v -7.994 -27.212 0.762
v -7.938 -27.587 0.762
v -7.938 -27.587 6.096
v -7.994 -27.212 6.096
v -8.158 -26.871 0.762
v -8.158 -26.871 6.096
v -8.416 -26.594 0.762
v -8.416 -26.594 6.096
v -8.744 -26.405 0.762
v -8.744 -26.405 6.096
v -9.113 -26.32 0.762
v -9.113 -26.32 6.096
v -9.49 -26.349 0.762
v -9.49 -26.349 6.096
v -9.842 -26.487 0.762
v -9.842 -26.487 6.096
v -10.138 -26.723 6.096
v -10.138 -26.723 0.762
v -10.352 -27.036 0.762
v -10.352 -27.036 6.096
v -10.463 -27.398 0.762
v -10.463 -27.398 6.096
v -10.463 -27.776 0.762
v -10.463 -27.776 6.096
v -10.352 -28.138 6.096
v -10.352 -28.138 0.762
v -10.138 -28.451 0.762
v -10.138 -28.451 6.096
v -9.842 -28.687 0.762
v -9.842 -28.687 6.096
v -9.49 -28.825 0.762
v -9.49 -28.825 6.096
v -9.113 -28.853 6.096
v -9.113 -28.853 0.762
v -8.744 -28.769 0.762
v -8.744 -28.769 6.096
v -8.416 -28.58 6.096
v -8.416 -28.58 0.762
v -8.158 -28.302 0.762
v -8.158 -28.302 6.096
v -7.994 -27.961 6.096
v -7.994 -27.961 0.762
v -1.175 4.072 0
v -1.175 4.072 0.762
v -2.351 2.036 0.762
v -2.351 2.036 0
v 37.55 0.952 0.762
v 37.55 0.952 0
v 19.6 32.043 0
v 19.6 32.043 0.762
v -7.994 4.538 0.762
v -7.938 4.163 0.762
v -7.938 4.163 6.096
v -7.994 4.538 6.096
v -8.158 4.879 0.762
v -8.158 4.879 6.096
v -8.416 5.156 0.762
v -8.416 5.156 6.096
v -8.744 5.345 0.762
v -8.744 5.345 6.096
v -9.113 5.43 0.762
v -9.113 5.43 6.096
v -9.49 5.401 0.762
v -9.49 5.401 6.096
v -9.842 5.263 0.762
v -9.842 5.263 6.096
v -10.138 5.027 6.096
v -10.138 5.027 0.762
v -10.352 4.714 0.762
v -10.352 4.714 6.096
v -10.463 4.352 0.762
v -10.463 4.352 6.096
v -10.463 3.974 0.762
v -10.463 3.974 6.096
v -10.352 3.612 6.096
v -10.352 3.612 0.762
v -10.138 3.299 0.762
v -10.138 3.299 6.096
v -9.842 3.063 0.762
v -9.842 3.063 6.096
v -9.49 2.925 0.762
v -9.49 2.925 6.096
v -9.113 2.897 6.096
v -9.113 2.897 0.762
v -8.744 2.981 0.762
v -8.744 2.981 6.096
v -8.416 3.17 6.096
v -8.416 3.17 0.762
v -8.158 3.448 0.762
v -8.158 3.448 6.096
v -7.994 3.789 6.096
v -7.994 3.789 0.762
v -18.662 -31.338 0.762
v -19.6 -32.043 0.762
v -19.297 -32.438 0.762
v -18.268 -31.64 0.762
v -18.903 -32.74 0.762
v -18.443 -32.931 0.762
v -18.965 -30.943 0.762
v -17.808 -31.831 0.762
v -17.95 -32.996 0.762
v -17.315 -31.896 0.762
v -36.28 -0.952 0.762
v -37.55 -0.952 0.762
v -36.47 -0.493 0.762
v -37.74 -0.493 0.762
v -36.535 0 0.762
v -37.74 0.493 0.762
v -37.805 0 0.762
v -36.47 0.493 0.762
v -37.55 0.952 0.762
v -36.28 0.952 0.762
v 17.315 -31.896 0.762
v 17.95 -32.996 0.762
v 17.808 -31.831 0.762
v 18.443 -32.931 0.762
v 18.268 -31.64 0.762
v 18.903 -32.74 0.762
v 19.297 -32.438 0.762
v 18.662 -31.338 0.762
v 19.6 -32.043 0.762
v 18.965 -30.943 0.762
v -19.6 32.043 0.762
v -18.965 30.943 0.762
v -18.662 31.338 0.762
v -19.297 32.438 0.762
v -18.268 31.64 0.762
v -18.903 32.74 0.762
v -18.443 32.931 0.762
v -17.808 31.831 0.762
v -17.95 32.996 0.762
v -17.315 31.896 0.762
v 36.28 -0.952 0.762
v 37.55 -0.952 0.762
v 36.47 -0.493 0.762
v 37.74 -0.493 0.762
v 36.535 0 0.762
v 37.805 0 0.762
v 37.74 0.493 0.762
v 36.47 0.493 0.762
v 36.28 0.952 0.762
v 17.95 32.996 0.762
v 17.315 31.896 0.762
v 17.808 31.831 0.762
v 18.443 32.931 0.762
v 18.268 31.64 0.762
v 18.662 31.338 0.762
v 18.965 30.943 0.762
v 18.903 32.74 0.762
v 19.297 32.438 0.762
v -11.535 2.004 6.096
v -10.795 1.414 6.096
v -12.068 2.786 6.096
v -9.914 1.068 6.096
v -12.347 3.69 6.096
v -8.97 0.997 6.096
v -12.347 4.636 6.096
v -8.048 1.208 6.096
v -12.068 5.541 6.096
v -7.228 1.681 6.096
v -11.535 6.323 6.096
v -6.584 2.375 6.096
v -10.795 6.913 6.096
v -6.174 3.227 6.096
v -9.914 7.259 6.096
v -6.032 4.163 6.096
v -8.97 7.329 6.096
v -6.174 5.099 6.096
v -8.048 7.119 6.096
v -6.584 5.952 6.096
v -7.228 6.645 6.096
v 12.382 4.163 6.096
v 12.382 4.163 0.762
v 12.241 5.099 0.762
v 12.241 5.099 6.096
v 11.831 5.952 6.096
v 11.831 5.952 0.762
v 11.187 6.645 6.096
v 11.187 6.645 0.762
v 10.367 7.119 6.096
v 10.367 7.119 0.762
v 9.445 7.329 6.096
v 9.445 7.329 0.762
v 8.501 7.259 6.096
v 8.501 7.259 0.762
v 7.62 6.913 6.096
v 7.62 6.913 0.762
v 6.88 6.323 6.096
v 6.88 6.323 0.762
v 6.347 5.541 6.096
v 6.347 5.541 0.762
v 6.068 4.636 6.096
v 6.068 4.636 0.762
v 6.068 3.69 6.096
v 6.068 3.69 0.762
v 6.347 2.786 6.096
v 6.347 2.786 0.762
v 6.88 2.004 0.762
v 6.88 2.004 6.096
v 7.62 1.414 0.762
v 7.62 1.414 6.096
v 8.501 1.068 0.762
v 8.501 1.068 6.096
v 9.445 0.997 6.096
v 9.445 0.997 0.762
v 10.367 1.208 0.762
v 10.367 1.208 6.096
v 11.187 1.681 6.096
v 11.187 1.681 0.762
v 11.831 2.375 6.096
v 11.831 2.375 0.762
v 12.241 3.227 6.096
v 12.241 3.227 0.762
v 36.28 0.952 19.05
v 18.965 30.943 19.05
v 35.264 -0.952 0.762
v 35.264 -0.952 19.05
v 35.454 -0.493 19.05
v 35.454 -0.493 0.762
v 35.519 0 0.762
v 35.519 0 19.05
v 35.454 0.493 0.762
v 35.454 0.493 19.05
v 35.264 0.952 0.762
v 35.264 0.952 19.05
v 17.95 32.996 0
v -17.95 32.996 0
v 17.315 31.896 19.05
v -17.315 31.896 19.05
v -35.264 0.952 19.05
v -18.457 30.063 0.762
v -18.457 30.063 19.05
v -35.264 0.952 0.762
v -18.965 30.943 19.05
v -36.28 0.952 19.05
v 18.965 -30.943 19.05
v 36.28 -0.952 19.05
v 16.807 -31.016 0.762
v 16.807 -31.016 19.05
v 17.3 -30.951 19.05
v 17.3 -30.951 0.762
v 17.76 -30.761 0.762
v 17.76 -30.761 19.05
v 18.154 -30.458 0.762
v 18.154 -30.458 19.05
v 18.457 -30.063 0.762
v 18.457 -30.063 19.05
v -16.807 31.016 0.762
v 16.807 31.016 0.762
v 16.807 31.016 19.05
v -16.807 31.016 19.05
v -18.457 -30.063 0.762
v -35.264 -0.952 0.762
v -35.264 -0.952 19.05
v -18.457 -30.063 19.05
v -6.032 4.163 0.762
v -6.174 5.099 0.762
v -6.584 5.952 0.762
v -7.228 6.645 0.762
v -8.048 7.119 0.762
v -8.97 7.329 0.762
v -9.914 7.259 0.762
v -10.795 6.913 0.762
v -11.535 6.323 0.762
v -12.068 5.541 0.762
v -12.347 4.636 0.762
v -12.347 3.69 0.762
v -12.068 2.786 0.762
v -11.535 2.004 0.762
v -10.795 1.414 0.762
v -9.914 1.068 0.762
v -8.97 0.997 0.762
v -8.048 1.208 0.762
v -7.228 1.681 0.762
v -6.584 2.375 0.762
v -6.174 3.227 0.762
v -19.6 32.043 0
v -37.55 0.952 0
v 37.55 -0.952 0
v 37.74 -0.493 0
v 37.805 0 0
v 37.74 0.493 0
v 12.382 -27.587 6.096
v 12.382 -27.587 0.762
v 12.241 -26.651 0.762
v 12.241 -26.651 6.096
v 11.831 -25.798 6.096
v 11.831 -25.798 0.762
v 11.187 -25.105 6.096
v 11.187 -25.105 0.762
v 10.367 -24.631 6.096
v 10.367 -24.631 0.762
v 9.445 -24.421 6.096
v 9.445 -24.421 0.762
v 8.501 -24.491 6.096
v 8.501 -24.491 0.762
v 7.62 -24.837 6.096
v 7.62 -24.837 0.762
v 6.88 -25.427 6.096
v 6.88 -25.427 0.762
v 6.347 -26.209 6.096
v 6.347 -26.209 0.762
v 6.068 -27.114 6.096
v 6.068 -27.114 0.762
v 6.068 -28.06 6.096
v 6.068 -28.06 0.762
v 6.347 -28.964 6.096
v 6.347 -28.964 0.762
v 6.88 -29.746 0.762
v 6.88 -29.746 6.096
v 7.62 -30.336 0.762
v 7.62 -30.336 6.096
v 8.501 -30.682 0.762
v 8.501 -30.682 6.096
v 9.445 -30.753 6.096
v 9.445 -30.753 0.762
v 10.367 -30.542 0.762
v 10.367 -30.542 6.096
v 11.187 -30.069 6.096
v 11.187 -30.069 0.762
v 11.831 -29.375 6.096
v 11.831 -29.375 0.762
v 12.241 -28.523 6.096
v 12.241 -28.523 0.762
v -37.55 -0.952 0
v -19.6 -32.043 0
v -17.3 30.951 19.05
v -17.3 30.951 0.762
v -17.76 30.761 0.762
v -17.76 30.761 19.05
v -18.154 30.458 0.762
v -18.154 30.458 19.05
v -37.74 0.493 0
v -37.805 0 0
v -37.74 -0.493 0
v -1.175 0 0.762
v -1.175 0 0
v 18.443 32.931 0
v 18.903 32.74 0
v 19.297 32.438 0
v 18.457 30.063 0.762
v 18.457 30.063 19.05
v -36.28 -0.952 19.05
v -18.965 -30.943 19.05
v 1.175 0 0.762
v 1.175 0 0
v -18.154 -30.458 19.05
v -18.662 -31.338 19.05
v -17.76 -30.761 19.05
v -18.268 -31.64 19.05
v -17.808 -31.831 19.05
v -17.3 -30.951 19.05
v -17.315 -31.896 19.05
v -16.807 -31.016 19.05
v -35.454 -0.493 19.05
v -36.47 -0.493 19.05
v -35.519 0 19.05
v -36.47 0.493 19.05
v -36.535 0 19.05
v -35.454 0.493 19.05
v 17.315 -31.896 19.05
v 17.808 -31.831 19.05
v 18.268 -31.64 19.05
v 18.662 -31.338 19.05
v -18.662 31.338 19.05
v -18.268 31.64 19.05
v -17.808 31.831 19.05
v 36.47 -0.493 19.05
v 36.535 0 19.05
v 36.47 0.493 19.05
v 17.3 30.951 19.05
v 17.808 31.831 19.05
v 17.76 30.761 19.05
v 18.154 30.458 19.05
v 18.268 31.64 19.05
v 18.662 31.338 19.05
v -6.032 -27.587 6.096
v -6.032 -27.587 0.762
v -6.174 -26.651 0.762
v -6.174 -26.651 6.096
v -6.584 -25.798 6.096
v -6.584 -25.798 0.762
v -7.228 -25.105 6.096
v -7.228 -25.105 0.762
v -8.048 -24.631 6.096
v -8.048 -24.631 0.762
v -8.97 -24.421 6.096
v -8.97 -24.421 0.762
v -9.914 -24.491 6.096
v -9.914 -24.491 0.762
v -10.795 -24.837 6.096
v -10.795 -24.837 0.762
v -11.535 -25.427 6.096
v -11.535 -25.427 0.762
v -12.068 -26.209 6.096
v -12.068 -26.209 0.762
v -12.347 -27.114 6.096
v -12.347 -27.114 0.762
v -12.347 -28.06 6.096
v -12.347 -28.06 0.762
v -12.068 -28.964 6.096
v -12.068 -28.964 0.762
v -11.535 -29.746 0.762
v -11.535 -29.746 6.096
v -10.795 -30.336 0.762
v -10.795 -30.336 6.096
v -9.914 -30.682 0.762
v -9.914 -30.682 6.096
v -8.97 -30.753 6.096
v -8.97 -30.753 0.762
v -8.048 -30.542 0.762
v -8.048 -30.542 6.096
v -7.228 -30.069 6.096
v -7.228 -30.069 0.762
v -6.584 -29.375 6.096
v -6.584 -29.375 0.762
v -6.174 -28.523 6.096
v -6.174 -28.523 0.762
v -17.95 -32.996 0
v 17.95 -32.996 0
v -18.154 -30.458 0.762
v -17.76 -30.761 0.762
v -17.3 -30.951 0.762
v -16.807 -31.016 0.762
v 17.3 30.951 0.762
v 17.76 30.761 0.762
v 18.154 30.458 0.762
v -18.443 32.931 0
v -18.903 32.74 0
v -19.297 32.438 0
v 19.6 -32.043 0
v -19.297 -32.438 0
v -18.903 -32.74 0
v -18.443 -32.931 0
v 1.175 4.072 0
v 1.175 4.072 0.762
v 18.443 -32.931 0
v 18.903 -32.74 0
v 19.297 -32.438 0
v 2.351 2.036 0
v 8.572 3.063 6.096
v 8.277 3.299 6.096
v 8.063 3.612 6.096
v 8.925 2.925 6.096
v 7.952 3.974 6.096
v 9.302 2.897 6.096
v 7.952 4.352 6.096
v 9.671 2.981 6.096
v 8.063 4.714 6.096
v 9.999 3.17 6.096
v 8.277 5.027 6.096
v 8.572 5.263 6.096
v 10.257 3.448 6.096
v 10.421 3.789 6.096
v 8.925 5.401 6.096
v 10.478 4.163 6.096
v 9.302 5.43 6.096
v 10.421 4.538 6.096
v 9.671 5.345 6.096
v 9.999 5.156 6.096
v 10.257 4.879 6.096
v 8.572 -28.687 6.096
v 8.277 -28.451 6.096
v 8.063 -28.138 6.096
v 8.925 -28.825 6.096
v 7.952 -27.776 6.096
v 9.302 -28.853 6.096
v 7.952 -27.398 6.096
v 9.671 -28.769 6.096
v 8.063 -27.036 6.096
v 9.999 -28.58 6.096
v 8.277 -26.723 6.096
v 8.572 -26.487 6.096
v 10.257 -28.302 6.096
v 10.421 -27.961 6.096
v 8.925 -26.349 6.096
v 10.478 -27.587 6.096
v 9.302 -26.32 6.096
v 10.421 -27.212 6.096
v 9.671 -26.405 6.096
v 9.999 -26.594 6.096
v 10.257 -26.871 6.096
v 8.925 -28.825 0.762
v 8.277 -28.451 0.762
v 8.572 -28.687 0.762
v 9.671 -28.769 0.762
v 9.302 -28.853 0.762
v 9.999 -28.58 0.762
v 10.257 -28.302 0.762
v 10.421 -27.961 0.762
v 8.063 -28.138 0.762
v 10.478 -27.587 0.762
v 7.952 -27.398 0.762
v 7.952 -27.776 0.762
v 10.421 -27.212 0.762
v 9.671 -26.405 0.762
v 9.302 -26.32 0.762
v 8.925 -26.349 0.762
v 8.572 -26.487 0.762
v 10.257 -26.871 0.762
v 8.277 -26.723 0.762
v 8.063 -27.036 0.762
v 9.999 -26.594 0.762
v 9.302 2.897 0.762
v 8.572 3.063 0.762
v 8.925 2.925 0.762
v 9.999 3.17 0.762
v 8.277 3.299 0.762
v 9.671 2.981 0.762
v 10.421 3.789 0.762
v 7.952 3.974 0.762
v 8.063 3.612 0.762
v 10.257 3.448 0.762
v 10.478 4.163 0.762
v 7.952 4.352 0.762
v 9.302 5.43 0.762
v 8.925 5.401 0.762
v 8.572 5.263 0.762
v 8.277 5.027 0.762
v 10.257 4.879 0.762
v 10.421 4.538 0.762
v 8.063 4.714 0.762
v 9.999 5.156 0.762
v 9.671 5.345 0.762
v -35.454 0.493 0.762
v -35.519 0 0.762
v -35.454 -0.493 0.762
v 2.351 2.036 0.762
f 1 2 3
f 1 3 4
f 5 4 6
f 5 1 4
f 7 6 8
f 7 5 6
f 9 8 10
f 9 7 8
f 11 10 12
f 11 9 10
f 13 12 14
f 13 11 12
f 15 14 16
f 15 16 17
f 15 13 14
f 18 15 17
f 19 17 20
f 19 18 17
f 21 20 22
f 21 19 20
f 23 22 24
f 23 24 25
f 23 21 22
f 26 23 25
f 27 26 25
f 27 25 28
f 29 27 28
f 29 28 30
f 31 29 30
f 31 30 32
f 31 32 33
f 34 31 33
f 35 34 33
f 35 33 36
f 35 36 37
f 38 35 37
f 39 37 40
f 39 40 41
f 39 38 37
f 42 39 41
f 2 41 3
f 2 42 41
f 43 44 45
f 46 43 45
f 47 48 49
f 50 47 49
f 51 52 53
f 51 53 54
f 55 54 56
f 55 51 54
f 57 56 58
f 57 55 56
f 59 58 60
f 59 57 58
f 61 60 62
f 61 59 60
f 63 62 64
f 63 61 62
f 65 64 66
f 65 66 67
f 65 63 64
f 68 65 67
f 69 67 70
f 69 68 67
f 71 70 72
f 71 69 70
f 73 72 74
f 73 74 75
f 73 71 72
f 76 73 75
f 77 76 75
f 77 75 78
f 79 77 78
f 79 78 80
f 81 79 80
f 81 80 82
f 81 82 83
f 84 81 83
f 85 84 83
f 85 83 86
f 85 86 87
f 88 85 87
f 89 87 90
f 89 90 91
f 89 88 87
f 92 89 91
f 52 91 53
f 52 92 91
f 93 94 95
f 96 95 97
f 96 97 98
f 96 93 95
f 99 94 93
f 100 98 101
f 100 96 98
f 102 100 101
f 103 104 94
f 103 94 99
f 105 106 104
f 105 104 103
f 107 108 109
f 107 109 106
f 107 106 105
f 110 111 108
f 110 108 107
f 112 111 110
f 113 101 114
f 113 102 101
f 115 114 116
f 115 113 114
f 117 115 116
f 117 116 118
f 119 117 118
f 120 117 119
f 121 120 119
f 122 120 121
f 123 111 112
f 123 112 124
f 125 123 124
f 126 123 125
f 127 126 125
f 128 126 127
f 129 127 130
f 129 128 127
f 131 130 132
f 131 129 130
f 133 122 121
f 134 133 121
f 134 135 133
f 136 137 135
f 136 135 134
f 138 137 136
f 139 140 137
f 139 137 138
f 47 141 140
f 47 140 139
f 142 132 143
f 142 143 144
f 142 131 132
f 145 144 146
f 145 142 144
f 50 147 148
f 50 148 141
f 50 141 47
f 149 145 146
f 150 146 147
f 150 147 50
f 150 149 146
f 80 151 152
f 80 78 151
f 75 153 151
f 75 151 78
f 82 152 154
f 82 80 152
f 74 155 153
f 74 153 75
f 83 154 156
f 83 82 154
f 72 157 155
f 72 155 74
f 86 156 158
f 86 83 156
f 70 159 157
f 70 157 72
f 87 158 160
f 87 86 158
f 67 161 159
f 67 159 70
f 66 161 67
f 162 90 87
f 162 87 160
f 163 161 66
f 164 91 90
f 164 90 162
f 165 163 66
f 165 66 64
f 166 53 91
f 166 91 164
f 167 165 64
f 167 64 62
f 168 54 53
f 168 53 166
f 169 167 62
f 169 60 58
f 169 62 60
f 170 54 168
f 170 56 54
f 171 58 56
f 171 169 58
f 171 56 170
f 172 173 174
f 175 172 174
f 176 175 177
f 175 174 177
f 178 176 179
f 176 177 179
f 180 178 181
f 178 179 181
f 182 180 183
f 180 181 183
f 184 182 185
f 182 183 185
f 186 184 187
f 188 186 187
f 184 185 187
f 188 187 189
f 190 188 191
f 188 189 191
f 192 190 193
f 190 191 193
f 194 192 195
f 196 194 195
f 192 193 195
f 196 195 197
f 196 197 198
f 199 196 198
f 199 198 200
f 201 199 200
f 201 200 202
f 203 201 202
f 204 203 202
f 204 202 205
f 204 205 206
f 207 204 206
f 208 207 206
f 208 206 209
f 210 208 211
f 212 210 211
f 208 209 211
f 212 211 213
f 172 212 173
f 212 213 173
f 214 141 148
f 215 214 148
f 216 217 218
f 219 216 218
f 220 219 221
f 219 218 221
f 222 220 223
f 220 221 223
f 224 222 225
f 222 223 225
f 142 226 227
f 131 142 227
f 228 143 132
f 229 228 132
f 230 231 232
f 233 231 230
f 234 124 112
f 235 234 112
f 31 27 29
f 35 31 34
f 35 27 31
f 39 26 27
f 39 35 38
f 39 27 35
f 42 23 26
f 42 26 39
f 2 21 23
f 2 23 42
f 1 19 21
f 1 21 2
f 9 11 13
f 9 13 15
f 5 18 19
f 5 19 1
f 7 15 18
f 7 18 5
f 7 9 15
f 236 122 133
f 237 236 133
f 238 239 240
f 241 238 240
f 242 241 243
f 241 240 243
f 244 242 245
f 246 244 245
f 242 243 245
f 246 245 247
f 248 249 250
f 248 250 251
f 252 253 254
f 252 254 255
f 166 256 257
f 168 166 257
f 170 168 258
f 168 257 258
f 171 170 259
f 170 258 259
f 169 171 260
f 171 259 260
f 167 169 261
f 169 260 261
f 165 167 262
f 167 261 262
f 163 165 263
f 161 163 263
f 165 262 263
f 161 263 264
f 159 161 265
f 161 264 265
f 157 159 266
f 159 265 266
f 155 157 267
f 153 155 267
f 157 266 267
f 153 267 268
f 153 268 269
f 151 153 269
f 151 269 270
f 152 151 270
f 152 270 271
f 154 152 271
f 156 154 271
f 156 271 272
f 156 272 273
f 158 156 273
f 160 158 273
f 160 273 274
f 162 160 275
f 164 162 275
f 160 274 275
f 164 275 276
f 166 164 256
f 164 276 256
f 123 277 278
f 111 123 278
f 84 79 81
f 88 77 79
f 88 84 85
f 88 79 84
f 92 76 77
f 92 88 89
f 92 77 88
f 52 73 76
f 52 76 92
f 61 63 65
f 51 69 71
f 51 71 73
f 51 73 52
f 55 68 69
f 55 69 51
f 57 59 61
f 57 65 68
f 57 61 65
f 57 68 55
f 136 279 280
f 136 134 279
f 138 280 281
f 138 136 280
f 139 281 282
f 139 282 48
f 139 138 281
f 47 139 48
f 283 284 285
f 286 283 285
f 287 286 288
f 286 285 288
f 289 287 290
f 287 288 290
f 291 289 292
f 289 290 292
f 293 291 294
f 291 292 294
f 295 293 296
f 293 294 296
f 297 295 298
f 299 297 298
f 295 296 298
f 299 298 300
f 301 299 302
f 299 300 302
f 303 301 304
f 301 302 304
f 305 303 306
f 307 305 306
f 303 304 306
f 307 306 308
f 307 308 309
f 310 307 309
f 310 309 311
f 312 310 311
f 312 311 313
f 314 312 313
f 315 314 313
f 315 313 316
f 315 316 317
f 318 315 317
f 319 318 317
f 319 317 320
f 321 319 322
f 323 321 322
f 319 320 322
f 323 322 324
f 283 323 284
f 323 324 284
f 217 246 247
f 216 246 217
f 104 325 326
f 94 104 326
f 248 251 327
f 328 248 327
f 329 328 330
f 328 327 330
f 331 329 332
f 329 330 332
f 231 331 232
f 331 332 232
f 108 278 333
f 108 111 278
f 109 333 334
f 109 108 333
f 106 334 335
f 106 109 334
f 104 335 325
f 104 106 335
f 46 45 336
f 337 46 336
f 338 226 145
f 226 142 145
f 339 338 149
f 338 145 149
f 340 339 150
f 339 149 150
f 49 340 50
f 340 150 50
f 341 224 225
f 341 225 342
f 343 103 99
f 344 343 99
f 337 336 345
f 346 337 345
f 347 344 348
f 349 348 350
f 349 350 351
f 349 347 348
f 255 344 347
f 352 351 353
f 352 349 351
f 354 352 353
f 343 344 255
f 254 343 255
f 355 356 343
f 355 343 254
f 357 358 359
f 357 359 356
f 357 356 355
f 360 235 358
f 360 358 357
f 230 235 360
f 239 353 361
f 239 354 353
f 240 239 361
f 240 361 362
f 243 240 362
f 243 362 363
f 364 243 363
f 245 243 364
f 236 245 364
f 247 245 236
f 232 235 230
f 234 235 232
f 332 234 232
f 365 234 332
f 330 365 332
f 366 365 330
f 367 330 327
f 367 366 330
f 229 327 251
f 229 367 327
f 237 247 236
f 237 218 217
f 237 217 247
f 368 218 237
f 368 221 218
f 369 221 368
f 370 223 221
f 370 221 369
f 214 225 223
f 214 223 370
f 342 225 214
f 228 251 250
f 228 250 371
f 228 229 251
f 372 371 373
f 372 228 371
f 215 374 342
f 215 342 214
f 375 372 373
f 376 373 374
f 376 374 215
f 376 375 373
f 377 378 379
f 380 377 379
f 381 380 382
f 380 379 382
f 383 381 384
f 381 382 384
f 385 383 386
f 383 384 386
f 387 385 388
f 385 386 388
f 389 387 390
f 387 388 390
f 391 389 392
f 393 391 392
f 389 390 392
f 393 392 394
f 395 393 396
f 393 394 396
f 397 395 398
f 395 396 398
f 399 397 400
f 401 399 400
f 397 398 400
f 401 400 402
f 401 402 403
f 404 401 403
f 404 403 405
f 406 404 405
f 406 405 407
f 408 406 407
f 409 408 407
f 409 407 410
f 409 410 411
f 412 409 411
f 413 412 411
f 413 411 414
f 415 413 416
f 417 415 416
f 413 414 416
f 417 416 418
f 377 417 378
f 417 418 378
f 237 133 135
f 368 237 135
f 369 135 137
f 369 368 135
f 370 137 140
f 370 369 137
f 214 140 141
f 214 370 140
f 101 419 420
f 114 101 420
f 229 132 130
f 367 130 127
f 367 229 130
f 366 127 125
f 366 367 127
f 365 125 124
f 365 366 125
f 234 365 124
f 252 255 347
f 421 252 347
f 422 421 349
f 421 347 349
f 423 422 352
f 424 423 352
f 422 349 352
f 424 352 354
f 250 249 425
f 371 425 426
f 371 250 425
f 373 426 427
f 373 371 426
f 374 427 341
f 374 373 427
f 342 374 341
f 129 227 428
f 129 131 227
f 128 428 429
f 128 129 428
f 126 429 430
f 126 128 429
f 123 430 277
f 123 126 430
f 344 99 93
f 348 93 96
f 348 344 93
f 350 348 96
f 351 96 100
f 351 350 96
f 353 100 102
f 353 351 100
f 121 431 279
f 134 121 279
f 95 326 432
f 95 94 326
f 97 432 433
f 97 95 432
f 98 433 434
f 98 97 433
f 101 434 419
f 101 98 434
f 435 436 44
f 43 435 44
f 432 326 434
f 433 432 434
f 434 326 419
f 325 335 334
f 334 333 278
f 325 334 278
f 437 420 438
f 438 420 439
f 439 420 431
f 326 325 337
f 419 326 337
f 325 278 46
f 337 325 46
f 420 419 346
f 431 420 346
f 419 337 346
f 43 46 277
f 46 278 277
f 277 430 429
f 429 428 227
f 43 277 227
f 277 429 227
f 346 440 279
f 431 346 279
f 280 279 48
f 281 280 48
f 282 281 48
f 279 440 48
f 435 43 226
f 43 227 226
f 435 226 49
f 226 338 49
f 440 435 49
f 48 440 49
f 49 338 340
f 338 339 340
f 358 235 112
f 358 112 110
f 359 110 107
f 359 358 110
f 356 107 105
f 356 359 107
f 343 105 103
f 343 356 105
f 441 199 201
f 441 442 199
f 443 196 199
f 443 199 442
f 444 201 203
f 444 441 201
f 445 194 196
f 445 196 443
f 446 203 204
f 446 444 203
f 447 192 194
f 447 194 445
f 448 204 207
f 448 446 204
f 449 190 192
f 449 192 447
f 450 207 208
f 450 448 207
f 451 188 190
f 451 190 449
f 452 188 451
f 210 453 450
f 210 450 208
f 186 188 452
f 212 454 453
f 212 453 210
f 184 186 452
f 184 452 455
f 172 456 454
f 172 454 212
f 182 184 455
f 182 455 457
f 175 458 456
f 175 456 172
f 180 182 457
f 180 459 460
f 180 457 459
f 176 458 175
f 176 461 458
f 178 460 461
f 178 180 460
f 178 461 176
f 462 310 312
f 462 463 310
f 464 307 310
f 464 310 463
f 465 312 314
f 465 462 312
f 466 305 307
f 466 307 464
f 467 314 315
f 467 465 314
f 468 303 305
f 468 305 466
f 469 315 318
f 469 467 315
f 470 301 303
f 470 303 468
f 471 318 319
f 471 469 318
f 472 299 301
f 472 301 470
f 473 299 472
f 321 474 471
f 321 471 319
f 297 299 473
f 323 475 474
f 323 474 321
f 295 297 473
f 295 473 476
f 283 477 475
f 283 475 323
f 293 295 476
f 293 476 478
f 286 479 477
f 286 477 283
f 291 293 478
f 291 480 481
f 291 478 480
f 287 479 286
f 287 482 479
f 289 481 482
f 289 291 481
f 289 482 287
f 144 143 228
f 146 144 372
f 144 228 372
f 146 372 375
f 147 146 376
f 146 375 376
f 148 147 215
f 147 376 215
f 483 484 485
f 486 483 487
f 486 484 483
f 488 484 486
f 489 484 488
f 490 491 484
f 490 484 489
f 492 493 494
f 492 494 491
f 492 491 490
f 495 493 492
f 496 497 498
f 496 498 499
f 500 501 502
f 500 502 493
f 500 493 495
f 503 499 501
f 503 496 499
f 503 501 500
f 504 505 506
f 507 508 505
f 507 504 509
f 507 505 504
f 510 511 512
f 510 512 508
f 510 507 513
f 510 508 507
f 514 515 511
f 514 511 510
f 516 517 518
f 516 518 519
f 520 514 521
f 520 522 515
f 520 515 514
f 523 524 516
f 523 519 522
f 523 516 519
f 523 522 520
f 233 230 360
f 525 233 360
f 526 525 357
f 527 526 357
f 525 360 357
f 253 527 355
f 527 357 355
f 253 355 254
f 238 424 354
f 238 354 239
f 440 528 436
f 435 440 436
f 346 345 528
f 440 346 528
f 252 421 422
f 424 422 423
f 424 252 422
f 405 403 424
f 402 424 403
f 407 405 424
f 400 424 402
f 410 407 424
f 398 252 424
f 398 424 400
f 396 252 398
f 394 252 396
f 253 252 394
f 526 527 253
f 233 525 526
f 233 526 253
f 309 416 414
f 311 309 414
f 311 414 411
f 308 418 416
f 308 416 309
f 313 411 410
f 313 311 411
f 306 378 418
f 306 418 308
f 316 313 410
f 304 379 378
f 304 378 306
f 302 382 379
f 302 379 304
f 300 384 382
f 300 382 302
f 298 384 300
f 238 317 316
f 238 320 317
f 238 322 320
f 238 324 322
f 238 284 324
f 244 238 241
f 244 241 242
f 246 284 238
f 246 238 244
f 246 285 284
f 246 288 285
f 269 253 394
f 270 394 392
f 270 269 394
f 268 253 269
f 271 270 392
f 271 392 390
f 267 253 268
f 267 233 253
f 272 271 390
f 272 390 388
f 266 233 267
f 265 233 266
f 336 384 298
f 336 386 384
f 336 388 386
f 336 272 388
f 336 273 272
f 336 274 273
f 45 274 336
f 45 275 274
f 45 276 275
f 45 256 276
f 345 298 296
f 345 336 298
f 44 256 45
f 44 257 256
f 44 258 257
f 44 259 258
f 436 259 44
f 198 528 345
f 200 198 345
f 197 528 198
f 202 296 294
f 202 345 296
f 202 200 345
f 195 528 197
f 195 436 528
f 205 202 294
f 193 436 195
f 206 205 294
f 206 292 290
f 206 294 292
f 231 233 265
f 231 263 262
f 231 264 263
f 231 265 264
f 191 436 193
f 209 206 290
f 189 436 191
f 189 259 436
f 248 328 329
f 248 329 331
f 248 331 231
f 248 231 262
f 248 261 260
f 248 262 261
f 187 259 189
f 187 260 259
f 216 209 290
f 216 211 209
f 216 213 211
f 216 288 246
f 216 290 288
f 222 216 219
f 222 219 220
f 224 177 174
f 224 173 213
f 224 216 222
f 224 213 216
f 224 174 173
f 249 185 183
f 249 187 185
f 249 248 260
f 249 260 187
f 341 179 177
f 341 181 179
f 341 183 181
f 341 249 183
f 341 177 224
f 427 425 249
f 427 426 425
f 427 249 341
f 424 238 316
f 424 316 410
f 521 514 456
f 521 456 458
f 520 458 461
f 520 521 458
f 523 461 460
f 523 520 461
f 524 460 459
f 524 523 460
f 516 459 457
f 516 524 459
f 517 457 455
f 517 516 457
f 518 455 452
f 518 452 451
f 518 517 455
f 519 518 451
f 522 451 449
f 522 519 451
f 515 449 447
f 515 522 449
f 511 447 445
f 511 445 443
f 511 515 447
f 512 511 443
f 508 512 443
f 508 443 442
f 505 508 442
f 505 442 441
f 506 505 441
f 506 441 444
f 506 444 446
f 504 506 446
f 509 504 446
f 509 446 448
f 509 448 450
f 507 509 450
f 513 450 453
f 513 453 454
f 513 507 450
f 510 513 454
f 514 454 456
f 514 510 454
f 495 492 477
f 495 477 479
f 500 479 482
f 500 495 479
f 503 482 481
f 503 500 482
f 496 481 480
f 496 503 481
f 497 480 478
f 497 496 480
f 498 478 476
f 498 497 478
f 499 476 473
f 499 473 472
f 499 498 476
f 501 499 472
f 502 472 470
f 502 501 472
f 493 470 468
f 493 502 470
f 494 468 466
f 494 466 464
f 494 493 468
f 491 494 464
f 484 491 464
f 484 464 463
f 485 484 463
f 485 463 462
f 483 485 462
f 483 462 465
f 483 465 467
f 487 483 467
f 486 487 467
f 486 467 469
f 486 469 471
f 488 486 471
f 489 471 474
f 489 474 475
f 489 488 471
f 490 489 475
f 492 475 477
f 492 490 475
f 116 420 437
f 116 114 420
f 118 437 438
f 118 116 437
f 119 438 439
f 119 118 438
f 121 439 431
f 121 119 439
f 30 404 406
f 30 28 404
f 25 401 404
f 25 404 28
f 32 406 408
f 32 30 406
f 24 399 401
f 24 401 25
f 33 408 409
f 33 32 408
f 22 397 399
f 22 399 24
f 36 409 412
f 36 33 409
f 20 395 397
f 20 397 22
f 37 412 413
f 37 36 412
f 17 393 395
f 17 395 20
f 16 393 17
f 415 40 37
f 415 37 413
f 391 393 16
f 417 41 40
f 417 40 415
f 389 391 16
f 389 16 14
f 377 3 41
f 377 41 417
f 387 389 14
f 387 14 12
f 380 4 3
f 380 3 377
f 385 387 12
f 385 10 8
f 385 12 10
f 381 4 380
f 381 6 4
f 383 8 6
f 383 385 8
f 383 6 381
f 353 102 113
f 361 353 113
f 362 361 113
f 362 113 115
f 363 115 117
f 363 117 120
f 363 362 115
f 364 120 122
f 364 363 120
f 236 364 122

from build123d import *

# Parameters (mm, degrees)
F1_DEPTH  = 0.762
F2_R      = 1.905
F4_DEPTH  = 19.05
F5_R      = 1.905
F7_DEPTH  = 25.4
F8_R      = 1.905
F12_DEPTH = 25.4
F11_R     = 3.175
F11_R_2   = 1.27
F13_DEPTH = 5.334


with BuildPart() as f1:
    # F0 (on Top) → F1 (new body)
    with BuildSketch(Plane.XY):
        Polygon((19.05, 32.995568), (-19.05, 32.995568), (-38.1, 0), (-19.05, -32.995568), (19.05, -32.995568), (38.1, 0), align=None)
    extrude(amount=F1_DEPTH)

    # F2
    f2_edges = [f1.edges().sort_by_distance(p)[0] for p in [
        (38.1, 0, 0.381),
        (19.05, 32.995568, 0.381),
        (-19.05, 32.995568, 0.381),
        (-38.1, 0, 0.381),
        (-19.05, -32.995568, 0.381),
        (19.05, -32.995568, 0.381),
    ]]
    fillet(f2_edges, radius=F2_R)


with BuildPart() as f4:
    # F3 (on Top) → F4 (new body)
    with BuildSketch(Plane.XY):
        Polygon((18.415, 31.895716), (-18.415, 31.895716), (-36.83, 0), (-18.415, -31.895716), (18.415, -31.895716), (36.83, 0), align=None)
    extrude(amount=F4_DEPTH)

    # F5
    f5_edges = [f4.edges().sort_by_distance(p)[0] for p in [
        (-18.415, -31.895716, 9.525),
        (18.415, -31.895716, 9.525),
        (36.83, 0, 9.525),
        (-36.83, 0, 9.525),
        (18.415, 31.895716, 9.525),
        (-18.415, 31.895716, 9.525),
    ]]
    fillet(f5_edges, radius=F5_R)


with BuildPart() as f7:
    # F6 (on Top) → F7 (new body)
    with BuildSketch(Plane.XY):
        Polygon((17.907, 31.015834), (-17.907, 31.015834), (-35.814, 0), (-17.907, -31.015834), (17.907, -31.015834), (35.814, 0), align=None)
    extrude(amount=F7_DEPTH)

    # F8
    f8_edges = [f7.edges().sort_by_distance(p)[0] for p in [
        (-17.907, -31.015834, 12.7),
        (17.907, -31.015834, 12.7),
        (35.814, 0, 12.7),
        (-35.814, 0, 12.7),
        (17.907, 31.015834, 12.7),
        (-17.907, 31.015834, 12.7),
    ]]
    fillet(f8_edges, radius=F8_R)


with BuildPart() as f7_1:
    # F9: moved
    add(f7.part.moved(Location((0, 0, 0.762))))


with BuildPart() as f4_1:
    add(f4.part)

    # F10: cut F7
    add(f7_1.part, mode=Mode.SUBTRACT)


with BuildPart() as f12_tool:
    # F11 (on face) → F12 (new body)
    with BuildSketch(Plane.XY.offset(0.762)):
        Polygon((-1.175437, 0), (1.175437, 0), (2.350874, 2.035916), (1.175437, 4.071832), (-1.175437, 4.071832), (-2.350874, 2.035916), align=None)
    extrude(amount=-F12_DEPTH)


with BuildPart() as f1_1:
    add(f1.part)

    # F12: cut by f12_tool
    add(f12_tool.part, mode=Mode.SUBTRACT)



with BuildPart() as f4_2:
    add(f4_1.part)

    # F12: cut by f12_tool
    add(f12_tool.part, mode=Mode.SUBTRACT)


with BuildPart() as f1_2:
    add(f1_1.part)

    add(f4_2.part)  # F13 merges F4
    # F11 (on face) → F13 (join)
    with BuildSketch(Plane.XY.offset(0.762)):
        with Locations((-9.2075, 4.163166)):
            Circle(F11_R)
        with Locations((-9.2075, 4.163166)):
            Circle(F11_R_2, mode=Mode.SUBTRACT)
        with Locations((9.2075, 4.163166)):
            Circle(F11_R)
        with Locations((9.2075, 4.163166)):
            Circle(F11_R_2, mode=Mode.SUBTRACT)
        with Locations((9.2075, -27.586834)):
            Circle(F11_R)
        with Locations((9.2075, -27.586834)):
            Circle(F11_R_2, mode=Mode.SUBTRACT)
        with Locations((-9.2075, -27.586834)):
            Circle(F11_R)
        with Locations((-9.2075, -27.586834)):
            Circle(F11_R_2, mode=Mode.SUBTRACT)
    extrude(amount=F13_DEPTH)


solid = f1_2.part
